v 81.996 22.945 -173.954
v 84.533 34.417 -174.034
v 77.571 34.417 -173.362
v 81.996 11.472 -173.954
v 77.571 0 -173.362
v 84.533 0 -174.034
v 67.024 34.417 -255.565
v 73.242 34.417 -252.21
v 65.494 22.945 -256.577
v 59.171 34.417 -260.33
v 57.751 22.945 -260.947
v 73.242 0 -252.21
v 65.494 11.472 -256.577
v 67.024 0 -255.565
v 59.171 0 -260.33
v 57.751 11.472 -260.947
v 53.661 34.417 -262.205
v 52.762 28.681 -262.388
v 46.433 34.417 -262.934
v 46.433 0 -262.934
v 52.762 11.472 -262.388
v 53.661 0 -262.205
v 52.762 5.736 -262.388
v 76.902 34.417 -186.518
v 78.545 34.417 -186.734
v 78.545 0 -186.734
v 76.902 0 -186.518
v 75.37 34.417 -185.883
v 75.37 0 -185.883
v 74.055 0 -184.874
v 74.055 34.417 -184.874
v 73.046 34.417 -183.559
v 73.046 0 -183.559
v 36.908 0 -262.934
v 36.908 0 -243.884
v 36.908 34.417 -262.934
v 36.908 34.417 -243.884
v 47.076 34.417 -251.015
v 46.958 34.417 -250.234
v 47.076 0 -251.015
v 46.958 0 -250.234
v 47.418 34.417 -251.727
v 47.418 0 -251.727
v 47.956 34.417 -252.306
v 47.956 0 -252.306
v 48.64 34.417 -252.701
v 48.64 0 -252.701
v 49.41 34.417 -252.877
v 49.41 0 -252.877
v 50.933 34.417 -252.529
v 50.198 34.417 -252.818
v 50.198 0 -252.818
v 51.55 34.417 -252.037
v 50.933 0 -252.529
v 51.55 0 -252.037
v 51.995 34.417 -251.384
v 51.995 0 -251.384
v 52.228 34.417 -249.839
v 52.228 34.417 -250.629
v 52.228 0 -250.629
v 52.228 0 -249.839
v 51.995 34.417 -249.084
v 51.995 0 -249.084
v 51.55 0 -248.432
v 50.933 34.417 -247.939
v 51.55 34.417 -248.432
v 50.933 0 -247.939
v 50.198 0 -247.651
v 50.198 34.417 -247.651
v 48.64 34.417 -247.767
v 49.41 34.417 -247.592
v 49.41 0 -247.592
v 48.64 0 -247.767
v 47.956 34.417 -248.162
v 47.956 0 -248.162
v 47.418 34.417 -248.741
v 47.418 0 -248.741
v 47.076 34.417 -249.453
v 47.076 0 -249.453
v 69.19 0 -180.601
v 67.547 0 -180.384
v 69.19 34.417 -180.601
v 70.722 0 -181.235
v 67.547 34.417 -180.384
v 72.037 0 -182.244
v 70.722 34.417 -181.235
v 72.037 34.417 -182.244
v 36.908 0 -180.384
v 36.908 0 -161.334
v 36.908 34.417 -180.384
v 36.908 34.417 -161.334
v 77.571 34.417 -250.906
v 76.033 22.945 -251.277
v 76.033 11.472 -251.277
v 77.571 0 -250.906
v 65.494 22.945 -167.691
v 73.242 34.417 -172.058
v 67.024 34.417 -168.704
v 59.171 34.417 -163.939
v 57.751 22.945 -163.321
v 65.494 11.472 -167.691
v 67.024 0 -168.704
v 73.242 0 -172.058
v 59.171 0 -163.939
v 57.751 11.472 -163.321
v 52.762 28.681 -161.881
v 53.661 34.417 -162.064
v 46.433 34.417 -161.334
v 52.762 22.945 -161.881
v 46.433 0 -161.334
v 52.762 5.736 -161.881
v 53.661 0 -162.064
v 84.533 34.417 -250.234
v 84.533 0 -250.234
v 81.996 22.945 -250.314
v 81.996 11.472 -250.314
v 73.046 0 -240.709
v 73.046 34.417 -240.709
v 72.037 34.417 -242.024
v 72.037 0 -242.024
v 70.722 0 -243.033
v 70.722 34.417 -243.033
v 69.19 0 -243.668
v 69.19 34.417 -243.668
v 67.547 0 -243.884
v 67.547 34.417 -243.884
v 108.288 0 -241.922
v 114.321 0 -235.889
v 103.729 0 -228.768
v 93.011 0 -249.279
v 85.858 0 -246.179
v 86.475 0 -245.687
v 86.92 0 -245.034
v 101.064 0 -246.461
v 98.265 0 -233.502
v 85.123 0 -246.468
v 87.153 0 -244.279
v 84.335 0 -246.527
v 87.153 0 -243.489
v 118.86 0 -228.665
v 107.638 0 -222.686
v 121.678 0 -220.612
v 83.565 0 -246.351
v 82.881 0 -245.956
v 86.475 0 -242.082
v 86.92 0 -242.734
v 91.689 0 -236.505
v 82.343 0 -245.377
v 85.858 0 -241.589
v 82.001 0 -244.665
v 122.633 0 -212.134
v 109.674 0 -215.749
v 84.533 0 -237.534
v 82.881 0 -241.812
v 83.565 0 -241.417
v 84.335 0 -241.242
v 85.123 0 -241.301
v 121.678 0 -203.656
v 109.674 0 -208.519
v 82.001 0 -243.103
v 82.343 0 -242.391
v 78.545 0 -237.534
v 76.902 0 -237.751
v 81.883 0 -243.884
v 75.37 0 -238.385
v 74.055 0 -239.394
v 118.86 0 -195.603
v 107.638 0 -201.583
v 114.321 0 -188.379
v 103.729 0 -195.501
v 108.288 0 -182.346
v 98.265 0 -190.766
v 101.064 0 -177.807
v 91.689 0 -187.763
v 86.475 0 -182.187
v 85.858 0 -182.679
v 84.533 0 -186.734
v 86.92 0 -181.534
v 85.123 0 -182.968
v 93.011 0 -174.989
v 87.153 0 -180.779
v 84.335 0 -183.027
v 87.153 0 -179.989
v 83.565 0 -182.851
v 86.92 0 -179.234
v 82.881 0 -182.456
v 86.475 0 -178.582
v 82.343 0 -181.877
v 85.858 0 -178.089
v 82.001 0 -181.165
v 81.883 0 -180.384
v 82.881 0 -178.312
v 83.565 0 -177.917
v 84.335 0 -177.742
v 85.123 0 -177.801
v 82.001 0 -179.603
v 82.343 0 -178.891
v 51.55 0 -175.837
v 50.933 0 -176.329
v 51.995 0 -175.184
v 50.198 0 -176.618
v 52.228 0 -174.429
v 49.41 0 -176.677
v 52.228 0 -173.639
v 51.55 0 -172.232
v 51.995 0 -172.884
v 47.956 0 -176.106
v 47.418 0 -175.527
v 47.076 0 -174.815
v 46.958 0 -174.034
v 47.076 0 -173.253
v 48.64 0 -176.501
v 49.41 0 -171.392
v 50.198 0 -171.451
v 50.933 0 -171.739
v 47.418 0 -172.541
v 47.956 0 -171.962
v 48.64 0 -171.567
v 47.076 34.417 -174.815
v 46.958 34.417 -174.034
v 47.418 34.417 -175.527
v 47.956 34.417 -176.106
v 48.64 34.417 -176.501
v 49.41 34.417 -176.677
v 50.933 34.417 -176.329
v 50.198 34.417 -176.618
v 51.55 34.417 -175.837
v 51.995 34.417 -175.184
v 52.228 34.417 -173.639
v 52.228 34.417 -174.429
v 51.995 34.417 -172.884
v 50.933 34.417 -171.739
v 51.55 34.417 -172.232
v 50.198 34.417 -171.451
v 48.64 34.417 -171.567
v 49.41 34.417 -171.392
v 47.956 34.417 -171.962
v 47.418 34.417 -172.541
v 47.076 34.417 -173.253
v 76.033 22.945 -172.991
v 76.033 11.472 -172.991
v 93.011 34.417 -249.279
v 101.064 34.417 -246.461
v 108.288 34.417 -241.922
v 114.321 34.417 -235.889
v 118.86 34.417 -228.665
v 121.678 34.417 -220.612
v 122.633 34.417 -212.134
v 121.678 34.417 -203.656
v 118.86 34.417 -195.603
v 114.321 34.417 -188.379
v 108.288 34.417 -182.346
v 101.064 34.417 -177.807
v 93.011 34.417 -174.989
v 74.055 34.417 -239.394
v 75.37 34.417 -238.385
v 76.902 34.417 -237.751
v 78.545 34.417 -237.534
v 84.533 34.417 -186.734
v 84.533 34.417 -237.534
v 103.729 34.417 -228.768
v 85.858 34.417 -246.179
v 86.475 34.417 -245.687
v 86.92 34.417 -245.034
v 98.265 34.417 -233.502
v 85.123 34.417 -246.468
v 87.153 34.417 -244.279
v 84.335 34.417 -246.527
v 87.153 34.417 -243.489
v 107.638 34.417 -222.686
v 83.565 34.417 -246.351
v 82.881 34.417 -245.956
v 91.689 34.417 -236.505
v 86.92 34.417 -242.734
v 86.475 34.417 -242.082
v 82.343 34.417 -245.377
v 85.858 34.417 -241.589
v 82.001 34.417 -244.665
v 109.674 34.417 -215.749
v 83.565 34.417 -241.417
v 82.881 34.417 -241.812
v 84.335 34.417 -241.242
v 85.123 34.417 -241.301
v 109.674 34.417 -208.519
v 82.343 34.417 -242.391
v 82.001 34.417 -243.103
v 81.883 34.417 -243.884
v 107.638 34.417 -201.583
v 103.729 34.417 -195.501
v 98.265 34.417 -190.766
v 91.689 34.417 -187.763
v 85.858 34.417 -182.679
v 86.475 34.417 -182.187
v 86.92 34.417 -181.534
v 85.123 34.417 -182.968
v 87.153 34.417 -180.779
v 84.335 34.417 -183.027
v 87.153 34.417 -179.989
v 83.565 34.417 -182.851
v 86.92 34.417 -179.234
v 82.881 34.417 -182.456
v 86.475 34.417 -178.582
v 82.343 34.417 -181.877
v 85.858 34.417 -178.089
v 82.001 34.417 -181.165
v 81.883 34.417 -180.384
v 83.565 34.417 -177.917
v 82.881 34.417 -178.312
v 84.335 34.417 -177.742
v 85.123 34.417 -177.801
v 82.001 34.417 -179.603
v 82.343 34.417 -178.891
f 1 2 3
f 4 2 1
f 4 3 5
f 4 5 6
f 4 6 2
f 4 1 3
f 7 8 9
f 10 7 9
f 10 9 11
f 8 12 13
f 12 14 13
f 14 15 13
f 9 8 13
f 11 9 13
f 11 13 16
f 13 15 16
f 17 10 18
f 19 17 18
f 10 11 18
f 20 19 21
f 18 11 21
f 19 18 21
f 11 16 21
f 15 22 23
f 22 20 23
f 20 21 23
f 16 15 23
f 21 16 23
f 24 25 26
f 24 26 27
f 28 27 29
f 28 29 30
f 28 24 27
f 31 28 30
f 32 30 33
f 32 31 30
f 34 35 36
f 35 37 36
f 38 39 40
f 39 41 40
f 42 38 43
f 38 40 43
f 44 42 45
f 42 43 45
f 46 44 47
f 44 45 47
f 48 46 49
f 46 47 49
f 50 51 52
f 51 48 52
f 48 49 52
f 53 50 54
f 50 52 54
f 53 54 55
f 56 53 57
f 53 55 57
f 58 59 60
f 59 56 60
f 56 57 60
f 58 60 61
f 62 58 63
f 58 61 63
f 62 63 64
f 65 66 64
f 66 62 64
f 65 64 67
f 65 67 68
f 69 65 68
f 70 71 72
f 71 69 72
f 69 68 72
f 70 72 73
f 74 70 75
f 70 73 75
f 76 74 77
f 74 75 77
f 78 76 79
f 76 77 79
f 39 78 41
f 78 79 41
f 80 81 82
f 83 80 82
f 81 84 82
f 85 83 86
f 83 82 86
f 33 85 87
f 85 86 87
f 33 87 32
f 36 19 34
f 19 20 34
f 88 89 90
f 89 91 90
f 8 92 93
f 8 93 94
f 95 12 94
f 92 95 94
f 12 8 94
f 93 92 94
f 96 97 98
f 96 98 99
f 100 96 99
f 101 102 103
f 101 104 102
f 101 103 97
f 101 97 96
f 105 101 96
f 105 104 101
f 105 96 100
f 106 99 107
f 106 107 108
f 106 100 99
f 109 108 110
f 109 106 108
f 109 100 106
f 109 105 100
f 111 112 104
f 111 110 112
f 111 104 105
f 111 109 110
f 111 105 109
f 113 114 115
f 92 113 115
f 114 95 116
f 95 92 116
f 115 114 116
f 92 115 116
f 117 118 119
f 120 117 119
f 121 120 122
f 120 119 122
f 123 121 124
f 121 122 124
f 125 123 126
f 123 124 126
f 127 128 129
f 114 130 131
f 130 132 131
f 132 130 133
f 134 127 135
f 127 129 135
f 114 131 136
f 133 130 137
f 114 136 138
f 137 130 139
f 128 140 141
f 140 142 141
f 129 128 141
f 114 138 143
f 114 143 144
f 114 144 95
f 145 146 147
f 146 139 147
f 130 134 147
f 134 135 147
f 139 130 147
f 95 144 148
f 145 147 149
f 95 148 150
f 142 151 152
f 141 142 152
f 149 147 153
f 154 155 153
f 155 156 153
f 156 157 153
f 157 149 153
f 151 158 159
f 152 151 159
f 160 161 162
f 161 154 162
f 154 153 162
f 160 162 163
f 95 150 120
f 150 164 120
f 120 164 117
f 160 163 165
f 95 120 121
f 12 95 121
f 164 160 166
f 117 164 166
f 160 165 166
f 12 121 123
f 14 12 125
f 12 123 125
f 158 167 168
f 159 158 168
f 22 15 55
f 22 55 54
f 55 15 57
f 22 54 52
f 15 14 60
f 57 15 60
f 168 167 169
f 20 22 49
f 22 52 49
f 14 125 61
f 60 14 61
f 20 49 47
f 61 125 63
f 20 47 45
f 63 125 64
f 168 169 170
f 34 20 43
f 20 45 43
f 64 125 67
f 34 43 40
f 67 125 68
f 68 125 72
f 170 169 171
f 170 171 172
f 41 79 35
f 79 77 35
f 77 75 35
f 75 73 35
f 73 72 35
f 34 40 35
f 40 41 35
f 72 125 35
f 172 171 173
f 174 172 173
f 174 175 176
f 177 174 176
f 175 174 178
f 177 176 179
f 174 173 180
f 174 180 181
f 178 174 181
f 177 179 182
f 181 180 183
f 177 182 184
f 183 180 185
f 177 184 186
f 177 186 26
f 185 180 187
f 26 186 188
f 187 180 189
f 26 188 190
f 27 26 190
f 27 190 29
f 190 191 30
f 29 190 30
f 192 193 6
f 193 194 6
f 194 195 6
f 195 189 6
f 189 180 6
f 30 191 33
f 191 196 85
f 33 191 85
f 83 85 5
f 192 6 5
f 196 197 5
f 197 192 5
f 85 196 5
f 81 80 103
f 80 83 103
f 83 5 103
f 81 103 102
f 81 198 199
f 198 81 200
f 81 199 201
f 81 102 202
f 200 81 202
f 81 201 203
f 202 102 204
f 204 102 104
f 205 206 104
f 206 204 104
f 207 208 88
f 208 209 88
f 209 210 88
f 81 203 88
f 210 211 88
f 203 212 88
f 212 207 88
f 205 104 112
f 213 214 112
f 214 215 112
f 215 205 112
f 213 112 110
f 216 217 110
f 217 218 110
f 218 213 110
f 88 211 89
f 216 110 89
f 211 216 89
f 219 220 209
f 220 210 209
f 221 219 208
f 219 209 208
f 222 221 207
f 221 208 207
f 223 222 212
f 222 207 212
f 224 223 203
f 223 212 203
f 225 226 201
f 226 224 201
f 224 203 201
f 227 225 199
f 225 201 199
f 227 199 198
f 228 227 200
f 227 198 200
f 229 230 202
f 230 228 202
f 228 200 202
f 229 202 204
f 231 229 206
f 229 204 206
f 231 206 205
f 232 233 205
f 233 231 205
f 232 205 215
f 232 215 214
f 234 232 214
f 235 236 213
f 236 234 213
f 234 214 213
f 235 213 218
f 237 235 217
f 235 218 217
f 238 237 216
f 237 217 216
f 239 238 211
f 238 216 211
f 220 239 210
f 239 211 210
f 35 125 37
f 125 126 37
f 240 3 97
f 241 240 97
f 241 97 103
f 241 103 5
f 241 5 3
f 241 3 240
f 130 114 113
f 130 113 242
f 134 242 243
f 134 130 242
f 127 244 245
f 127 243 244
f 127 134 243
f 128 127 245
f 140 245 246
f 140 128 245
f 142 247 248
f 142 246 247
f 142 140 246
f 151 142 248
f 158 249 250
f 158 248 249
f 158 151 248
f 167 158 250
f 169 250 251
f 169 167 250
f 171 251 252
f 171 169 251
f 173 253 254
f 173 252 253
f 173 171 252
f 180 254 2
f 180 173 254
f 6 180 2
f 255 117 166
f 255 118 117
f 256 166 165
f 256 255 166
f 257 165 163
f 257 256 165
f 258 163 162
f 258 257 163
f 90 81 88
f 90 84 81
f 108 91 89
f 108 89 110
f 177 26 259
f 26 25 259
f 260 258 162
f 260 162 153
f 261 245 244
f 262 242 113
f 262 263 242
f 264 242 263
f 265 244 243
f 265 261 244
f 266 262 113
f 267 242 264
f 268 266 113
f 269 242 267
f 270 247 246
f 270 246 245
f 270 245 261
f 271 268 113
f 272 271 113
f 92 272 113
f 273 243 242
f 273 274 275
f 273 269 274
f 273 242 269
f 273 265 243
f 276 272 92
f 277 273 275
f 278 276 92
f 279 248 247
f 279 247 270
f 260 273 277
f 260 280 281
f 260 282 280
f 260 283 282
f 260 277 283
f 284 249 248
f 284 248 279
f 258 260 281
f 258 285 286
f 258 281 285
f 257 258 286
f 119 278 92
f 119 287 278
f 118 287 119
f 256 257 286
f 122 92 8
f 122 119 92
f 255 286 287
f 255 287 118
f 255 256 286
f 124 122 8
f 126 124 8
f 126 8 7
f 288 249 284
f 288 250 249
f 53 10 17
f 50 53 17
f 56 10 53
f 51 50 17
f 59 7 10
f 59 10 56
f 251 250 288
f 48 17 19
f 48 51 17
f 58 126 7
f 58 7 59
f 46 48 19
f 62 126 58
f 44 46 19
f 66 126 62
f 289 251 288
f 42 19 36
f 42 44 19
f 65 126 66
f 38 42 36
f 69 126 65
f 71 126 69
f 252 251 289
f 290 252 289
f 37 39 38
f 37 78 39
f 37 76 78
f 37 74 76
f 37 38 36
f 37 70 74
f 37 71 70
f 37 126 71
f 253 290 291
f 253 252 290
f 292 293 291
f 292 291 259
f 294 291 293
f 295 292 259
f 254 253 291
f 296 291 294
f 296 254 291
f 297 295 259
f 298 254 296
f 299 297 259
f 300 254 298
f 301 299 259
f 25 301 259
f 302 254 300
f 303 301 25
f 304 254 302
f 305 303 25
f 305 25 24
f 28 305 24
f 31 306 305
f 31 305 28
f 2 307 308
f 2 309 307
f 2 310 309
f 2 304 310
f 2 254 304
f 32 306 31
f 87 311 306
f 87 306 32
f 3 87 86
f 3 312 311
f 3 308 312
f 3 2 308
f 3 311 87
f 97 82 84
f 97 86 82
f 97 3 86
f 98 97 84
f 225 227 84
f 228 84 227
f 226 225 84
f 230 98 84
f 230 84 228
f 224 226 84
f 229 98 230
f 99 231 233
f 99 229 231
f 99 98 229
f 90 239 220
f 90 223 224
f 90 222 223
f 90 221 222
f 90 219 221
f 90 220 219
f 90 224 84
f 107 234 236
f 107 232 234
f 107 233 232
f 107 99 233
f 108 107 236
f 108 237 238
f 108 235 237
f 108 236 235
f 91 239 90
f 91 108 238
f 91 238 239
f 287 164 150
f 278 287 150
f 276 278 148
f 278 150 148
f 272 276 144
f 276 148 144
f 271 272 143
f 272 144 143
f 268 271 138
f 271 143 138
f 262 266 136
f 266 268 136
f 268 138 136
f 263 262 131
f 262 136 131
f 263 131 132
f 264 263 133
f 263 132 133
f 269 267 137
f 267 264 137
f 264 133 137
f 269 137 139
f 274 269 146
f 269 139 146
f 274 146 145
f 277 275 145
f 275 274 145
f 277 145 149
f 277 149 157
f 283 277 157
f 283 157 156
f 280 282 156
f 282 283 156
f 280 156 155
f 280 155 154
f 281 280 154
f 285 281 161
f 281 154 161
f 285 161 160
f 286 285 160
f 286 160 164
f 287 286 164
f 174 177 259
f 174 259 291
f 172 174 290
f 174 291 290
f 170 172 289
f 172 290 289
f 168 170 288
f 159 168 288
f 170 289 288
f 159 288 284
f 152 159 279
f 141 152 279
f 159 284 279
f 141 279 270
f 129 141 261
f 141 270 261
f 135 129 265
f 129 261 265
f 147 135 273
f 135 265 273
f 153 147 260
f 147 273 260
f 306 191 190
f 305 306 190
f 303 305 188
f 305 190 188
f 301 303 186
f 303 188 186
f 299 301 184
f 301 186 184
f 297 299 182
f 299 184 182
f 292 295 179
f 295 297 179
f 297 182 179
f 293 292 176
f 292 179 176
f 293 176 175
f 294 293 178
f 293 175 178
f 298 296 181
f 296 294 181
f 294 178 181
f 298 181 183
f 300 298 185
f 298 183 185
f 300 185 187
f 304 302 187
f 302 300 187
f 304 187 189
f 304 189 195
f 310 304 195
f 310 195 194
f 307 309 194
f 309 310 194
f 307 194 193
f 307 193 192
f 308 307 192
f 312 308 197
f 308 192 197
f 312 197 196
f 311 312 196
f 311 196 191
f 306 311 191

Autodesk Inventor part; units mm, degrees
ref_plane "YZ Plane" through (0, 0, 0) normal (1, 0, 0) x (0, 1, 0)
ref_plane "XZ Plane" through (0, 0, 0) normal (0, 1, 0) x (-1, 0, 0)
ref_plane "XY Plane" through (0, 0, 0) normal (0, 0, 1) x (1, 0, 0)
sketch "Sketch1" plane through (0, 0, 0) normal (0, 1, 0) x (-1, 0, 0)
  line L0 (99.4671, -212.1342) -> (-395.7488, 283.0816) construction
  circle A0 centre (-24.2079, -174.0342) radius 2.65
  circle A1 centre (-21.0329, -212.1342) radius 6.35
  circle A2 centre (1.1921, -174.0342) radius 2.65
  circle A3 centre (10.7171, -212.1342) radius 14.2875
  circle A4 centre (26.5921, -174.0342) radius 2.65
  line L1 (-84.5329, -212.1342) -> (10.7171, -212.1342) construction
  line L2 (39.2921, -161.3342) -> (-113.1079, -161.3342)
  line L3 (-113.1079, -262.9342) -> (39.2921, -262.9342)
  circle A5 centre (-49.6079, -174.0342) radius 2.65
  circle A6 centre (-52.7829, -212.1342) radius 6.35
  circle A7 centre (-75.0079, -174.0342) radius 2.65
  circle A8 centre (-75.0079, -250.2342) radius 2.65
  circle A9 centre (-84.5329, -212.1342) radius 14.2875
  circle A10 centre (-100.4079, -174.0342) radius 2.65
  circle A11 centre (-100.4079, -250.2342) radius 2.65
  circle A12 centre (-49.6079, -250.2342) radius 2.65
  circle A13 centre (1.1921, -250.2342) radius 2.65
  circle A14 centre (26.5921, -250.2342) radius 2.65
  circle A15 centre (-24.2079, -250.2342) radius 2.65
  line L4 (39.2921, -262.9342) -> (39.2921, -161.3342)
  line L5 (39.2921, -237.5342) -> (395.5271, -237.5342)
  line L6 (74.0671, -186.7342) -> (39.2921, -186.7342)
  line L7 (-113.1079, -161.3342) -> (-113.1079, -262.9342)
  spline S0 degree 3 poles (-84.5329, -174.0342) (-65.4829, -174.0342) (-65.4829, -161.3342) (-46.4329, -161.3342) knots 1 1 1 1 2 2 2 2
  line L8 (-84.5329, -174.0342) -> (-65.4829, -174.0342) construction
  line L9 (-65.4829, -174.0342) -> (-65.4829, -161.3342) construction
  line L10 (-65.4829, -161.3342) -> (-46.4329, -161.3342) construction
  circle A16 centre (-84.5329, -212.1342) radius 38.1
  circle A17 centre (-84.5329, -180.3842) radius 2.65
  spline S1 degree 3 poles (-84.5329, -250.2342) (-65.4829, -250.2342) (-65.4829, -262.9342) (-46.4329, -262.9342) knots 1 1 1 1 2 2 2 2
  line L11 (-84.5329, -250.2342) -> (-65.4829, -250.2342) construction
  line L12 (-65.4829, -250.2342) -> (-65.4829, -262.9342) construction
  line L13 (-65.4829, -262.9342) -> (-46.4329, -262.9342) construction
  circle A18 centre (-84.5329, -243.8842) radius 2.65
  point P0 (0, 0)
  point P1 (-36.9079, -262.9342)
  point P2 (-36.9079, -212.1342)
  point P3 (39.2921, -212.1342)
  point P4 (-46.4329, -262.9342)
  point P5 (-46.4329, -161.3342)
  dimension "d0" = 31.75
extrude "Extrusion1" add sketch "Sketch1" along normal blind 34.417 contours L4 L3 S1 A8 A16 A7 S0 L2 | A7 A16 S0 | A16 A7 A8 L7 | L7 A16 | A7 A16 S0 | A7 A16 | A16 A8 S1 | S1 A8 A16 | A8 A16
sketch "Sketch2" plane through (0, 34.417, 0) normal (0, 1, 0) x (1, 0, 0)
  circle A0 centre (49.6079, 174.0342) radius 2.65 projected
  circle A1 centre (49.6079, 174.0342) radius 2.65
  line L0 (49.6079, 174.0342) -> (36.9079, 174.0342)
  line L1 (-39.2921, 161.3342) -> (46.4329, 161.3342) projected
  line L2 (36.9079, 161.3342) -> (36.9079, 271.4653)
  line L3 (36.9079, 271.4653) -> (-75.2217, 284.061)
  line L4 (-75.2217, 284.061) -> (-39.9967, 13.0358)
  line L5 (-39.9967, 13.0358) -> (36.9079, 161.3342)
  point P0 (0, 0)
  dimension "d3" = 12.7
extrude "Extrusion2" cut sketch "Sketch2" against normal through all contours L2 L5 L4 L3
sketch "Sketch3" plane through (0, 34.417, 0) normal (0, 1, 0) x (1, 0, 0)
  line L0 (26.0555, 454.6039) -> (26.0555, 378.7664)
  line L1 (26.0555, 454.6039) -> (26.0555, 378.7664)
  arc A0 (38.7555, 340.6664) -> (114.9555, 340.6664) centre (76.8555, 340.6664) ccw
  circle A1 centre (76.8555, 340.6664) radius 38.1
  line L2 (26.0555, 378.7664) -> (45.1055, 378.7664)
  line L3 (45.1055, 357.6525) -> (45.1055, 454.6039)
  arc A2 (51.4555, 340.6664) -> (102.2555, 340.6664) centre (76.8555, 340.6664) ccw
  line L4 (45.1055, 378.7664) -> (51.4555, 378.7664)
  line L5 (51.4555, 346.6539) -> (51.4555, 340.6664)
  line L6 (45.1055, 353.0039) -> (45.1055, 353.0039)
  arc A3 (51.4555, 346.6539) -> (48.2805, 352.1532) centre (45.1055, 346.6539) ccw
  arc A4 (45.1055, 357.6525) -> (48.2805, 352.1532) centre (51.4555, 357.6525) ccw
  line L7 (108.6055, 357.6525) -> (108.6055, 454.6039)
  arc A5 (105.4305, 352.1532) -> (102.2555, 346.6539) centre (108.6055, 346.6539) ccw
  arc A6 (105.4305, 352.1532) -> (108.6055, 357.6525) centre (102.2555, 357.6525) ccw
  line L8 (102.2555, 346.6539) -> (102.2555, 340.6664)
  line L9 (127.6555, 378.7664) -> (127.6555, 454.8164)
  line L10 (127.6555, 454.8164) -> (127.6555, 337.8192)
  spline S0 degree 3 poles (26.0555, 378.7664) (26.0555, 359.7164) (38.7555, 359.7164) (38.7555, 340.6664) knots 1 1 1 1 2 2 2 2
  line L11 (26.0555, 378.7664) -> (26.0555, 359.7164) construction
  line L12 (26.0555, 359.7164) -> (38.7555, 359.7164) construction
  line L13 (38.7555, 359.7164) -> (38.7555, 340.6664) construction
  line L14 (76.8555, 340.6664) -> (76.8555, 373.056)
  spline S1 degree 3 poles (127.6555, 378.7664) (127.6555, 359.7164) (114.9555, 359.7164) (114.9555, 340.6664) knots 1 1 1 1 2 2 2 2
  line L15 (127.6555, 378.7664) -> (127.6555, 359.7164) construction
  line L16 (127.6555, 359.7164) -> (114.9555, 359.7164) construction
  line L17 (114.9555, 359.7164) -> (114.9555, 340.6664) construction
  circle A7 centre (38.7555, 400.9914) radius 2.65
  circle A8 centre (38.7555, 400.9914) radius 2.65
  circle A9 centre (38.7555, 375.5914) radius 2.65
  circle A10 centre (38.7555, 375.5914) radius 2.65
  circle A11 centre (45.1055, 340.6664) radius 2.65
  circle A12 centre (45.1055, 340.6664) radius 2.65
  circle A13 centre (108.6055, 340.6664) radius 2.65
  circle A14 centre (108.6055, 340.6664) radius 2.65
  circle A15 centre (114.9555, 375.5914) radius 2.65
  circle A16 centre (114.9555, 375.5914) radius 2.65
  circle A17 centre (114.9555, 400.9914) radius 2.65
  circle A18 centre (114.9555, 400.9914) radius 2.65
  circle A19 centre (76.8555, 308.9164) radius 2.65
  circle A20 centre (76.8555, 308.9164) radius 2.65
  line L18 (70.868, 315.2664) -> (76.8555, 315.2664)
  arc A21 (70.868, 315.2664) -> (65.3687, 312.0914) centre (70.868, 308.9164) ccw
  line L19 (64.518, 308.9164) -> (64.518, 308.9164)
  arc A22 (59.8694, 308.9164) -> (65.3687, 312.0914) centre (59.8694, 315.2664) ccw
  line L20 (57.8055, 302.5664) -> (76.8555, 302.5664) construction
  spline S2 degree 3 poles (38.7555, 289.8664) (57.8055, 289.8664) (57.8055, 302.5664) (76.8555, 302.5664) knots 1 1 1 1 2 2 2 2
  line L21 (38.7555, 289.8664) -> (57.8055, 289.8664) construction
  line L22 (57.8055, 289.8664) -> (57.8055, 302.5664) construction
  line L23 (38.7555, 308.9164) -> (38.7555, 315.2664)
  line L24 (38.7555, 289.8664) -> (38.7555, 308.9164)
  circle A23 centre (41.9305, 302.5664) radius 2.65
  line L25 (-37.082, 289.8664) -> (38.7555, 289.8664)
  line L26 (-37.082, 289.8664) -> (38.7555, 289.8664)
  line L27 (59.8694, 308.9164) -> (-37.082, 308.9164)
  line L28 (59.8694, 372.4164) -> (-37.082, 372.4164)
  circle A24 centre (16.5305, 378.7664) radius 2.65
  circle A25 centre (16.5305, 378.7664) radius 2.65
  line L29 (-37.2945, 391.4664) -> (79.7027, 391.4664)
  line L30 (38.7555, 391.4664) -> (-37.2945, 391.4664)
  circle A26 centre (16.5305, 302.5664) radius 2.65
  circle A27 centre (16.5305, 302.5664) radius 2.65
  circle A28 centre (41.9305, 302.5664) radius 2.65
  circle A29 centre (41.9305, 378.7664) radius 2.65
  circle A30 centre (41.9305, 378.7664) radius 2.65
  line L31 (38.7555, 391.4664) -> (57.8055, 391.4664) construction
  spline S3 degree 3 poles (38.7555, 391.4664) (57.8055, 391.4664) (57.8055, 378.7664) (76.8555, 378.7664) knots 1 1 1 1 2 2 2 2
  line L32 (57.8055, 391.4664) -> (57.8055, 378.7664) construction
  line L33 (57.8055, 378.7664) -> (76.8555, 378.7664) construction
  arc A31 (65.3687, 369.2414) -> (59.8694, 372.4164) centre (59.8694, 366.0664) ccw
  arc A32 (65.3687, 369.2414) -> (70.868, 366.0664) centre (70.868, 372.4164) ccw
  line L34 (70.868, 366.0664) -> (76.8555, 366.0664)
  circle A33 centre (76.8555, 372.4164) radius 2.65
  circle A34 centre (76.8555, 372.4164) radius 2.65
  arc A35 (76.8555, 302.5664) -> (76.8555, 378.7664) centre (76.8555, 340.6664) ccw
  circle A36 centre (76.8555, 340.6664) radius 38.1
  line L35 (76.8555, 340.6664) -> (44.4659, 340.6664)
  arc A37 (76.8555, 315.2664) -> (76.8555, 366.0664) centre (76.8555, 340.6664) ccw
  circle A38 centre (84.5329, 212.1342) radius 14.2875 projected
  circle A39 centre (84.5329, 212.1342) radius 14.2875
  circle A40 centre (52.7829, 212.1342) radius 2.65
  circle A41 centre (52.7829, 212.1342) radius 2.65
  line L36 (59.1329, 218.1218) -> (59.1329, 212.1342)
  arc A42 (59.1329, 218.1218) -> (55.9579, 223.6211) centre (52.7829, 218.1218) ccw
  line L37 (52.7829, 224.4718) -> (52.7829, 224.4718)
  arc A43 (52.7829, 229.1203) -> (55.9579, 223.6211) centre (59.1329, 229.1203) ccw
  line L38 (46.4329, 231.1842) -> (46.4329, 212.1342) construction
  spline S4 degree 3 poles (33.7329, 250.2342) (33.7329, 231.1842) (46.4329, 231.1842) (46.4329, 212.1342) knots 1 1 1 1 2 2 2 2
  line L39 (33.7329, 250.2342) -> (33.7329, 231.1842) construction
  line L40 (33.7329, 231.1842) -> (46.4329, 231.1842) construction
  line L41 (52.7829, 250.2342) -> (59.1329, 250.2342)
  line L42 (33.7329, 250.2342) -> (52.7829, 250.2342)
  circle A44 centre (46.4329, 247.0592) radius 2.65
  line L43 (33.7329, 326.0718) -> (33.7329, 250.2342)
  line L44 (33.7329, 326.0718) -> (33.7329, 250.2342)
  line L45 (52.7829, 229.1203) -> (52.7829, 326.0718)
  line L46 (116.2829, 229.1203) -> (116.2829, 326.0718)
  circle A45 centre (122.6329, 272.4592) radius 2.65
  circle A46 centre (122.6329, 272.4592) radius 2.65
  line L47 (135.3329, 326.2842) -> (135.3329, 209.2871)
  line L48 (135.3329, 250.2342) -> (135.3329, 326.2842)
  circle A47 centre (46.4329, 272.4592) radius 2.65
  circle A48 centre (46.4329, 272.4592) radius 2.65
  circle A49 centre (46.4329, 247.0592) radius 2.65
  circle A50 centre (122.6329, 247.0592) radius 2.65
  circle A51 centre (122.6329, 247.0592) radius 2.65
  line L49 (135.3329, 250.2342) -> (135.3329, 231.1842) construction
  spline S5 degree 3 poles (135.3329, 250.2342) (135.3329, 231.1842) (122.6329, 231.1842) (122.6329, 212.1342) knots 1 1 1 1 2 2 2 2
  line L50 (135.3329, 231.1842) -> (122.6329, 231.1842) construction
  line L51 (122.6329, 231.1842) -> (122.6329, 212.1342) construction
  arc A52 (113.1079, 223.6211) -> (116.2829, 229.1203) centre (109.9329, 229.1203) ccw
  arc A53 (113.1079, 223.6211) -> (109.9329, 218.1218) centre (116.2829, 218.1218) ccw
  line L52 (109.9329, 218.1218) -> (109.9329, 212.1342)
  circle A54 centre (116.2829, 212.1342) radius 2.65
  circle A55 centre (116.2829, 212.1342) radius 2.65
  arc A56 (46.4329, 212.1342) -> (122.6329, 212.1342) centre (84.5329, 212.1342) ccw
  circle A57 centre (84.5329, 212.1342) radius 38.1
  line L53 (84.5329, 212.1342) -> (84.5329, 244.5238)
  arc A58 (59.1329, 212.1342) -> (109.9329, 212.1342) centre (84.5329, 212.1342) ccw
  line L54 (78.5454, 237.5342) -> (84.5329, 237.5342)
  arc A59 (73.0461, 240.7092) -> (78.5454, 237.5342) centre (78.5454, 243.8842) ccw
  line L55 (84.5329, 212.1342) -> (52.1434, 212.1342)
  arc A60 (84.5329, 186.7342) -> (84.5329, 237.5342) centre (84.5329, 212.1342) ccw
  circle A61 centre (84.5329, 212.1342) radius 38.1
  arc A62 (84.5329, 174.0342) -> (84.5329, 250.2342) centre (84.5329, 212.1342) ccw
  line L56 (78.5454, 186.7342) -> (84.5329, 186.7342)
  arc A63 (78.5454, 186.7342) -> (73.0461, 183.5592) centre (78.5454, 180.3842) ccw
  line L57 (72.1954, 180.3842) -> (72.1954, 180.3842)
  arc A64 (67.5469, 180.3842) -> (73.0461, 183.5592) centre (67.5469, 186.7342) ccw
  circle A65 centre (84.5329, 180.3842) radius 2.65
  circle A66 centre (84.5329, 180.3842) radius 2.65
  line L58 (65.4829, 174.0342) -> (84.5329, 174.0342) construction
  spline S6 degree 3 poles (46.4329, 161.3342) (65.4829, 161.3342) (65.4829, 174.0342) (84.5329, 174.0342) knots 1 1 1 1 2 2 2 2
  line L59 (46.4329, 161.3342) -> (65.4829, 161.3342) construction
  line L60 (65.4829, 161.3342) -> (65.4829, 174.0342) construction
  line L61 (46.4329, 180.3842) -> (46.4329, 186.7342)
  circle A67 centre (84.5329, 243.8842) radius 2.65
  circle A68 centre (84.5329, 243.8842) radius 2.65
  line L62 (65.4829, 250.2342) -> (84.5329, 250.2342) construction
  spline S7 degree 3 poles (46.4329, 262.9342) (65.4829, 262.9342) (65.4829, 250.2342) (84.5329, 250.2342) knots 1 1 1 1 2 2 2 2
  line L63 (46.4329, 262.9342) -> (65.4829, 262.9342) construction
  line L64 (65.4829, 262.9342) -> (65.4829, 250.2342) construction
  circle A69 centre (49.6079, 250.2342) radius 2.65
  circle A70 centre (49.6079, 250.2342) radius 2.65
  arc A71 (73.0461, 240.7092) -> (67.5469, 243.8842) centre (67.5469, 237.5342) ccw
  line L65 (46.4329, 161.3342) -> (46.4329, 180.3842)
  circle A72 centre (49.6079, 174.0342) radius 2.65
  line L66 (-29.4046, 161.3342) -> (46.4329, 161.3342)
  line L67 (-29.4046, 161.3342) -> (46.4329, 161.3342)
  line L68 (67.5469, 180.3842) -> (-29.4046, 180.3842)
  line L69 (67.5469, 243.8842) -> (-29.4046, 243.8842)
  circle A73 centre (24.2079, 250.2342) radius 2.65
  circle A74 centre (24.2079, 250.2342) radius 2.65
  line L70 (-29.6171, 262.9342) -> (87.3801, 262.9342)
  line L71 (46.4329, 262.9342) -> (-29.6171, 262.9342)
  circle A75 centre (49.6079, 174.0342) radius 2.65
  circle A76 centre (24.2079, 174.0342) radius 2.65
  circle A77 centre (24.2079, 174.0342) radius 2.65
  line L72 (-29.4046, 180.3842) -> (-29.4046, 243.8842)
  point P0 (0, 0)
  point P1 (161.6667, 205.692)
  point P2 (36.9079, 161.3342)
  point P3 (71.58, 306.9082)
  point P4 (46.4329, 161.3342)
  point P5 (110.6137, 335.3909)
  point P6 (79.2575, 178.376)
  point P7 (118.2912, 206.8588)
  dimension "d9" = 19.05
  dimension "d10" = 12.7
  dimension "d11" = 76.2
  dimension "d12" = 101.6
  dimension "d13" = 6.35
  dimension "d14" = 19.05
  dimension "d15" = 19.05
  dimension "d16" = 19.05
  dimension "d17" = 12.7
  dimension "d18" = 76.2
  dimension "d19" = 101.6
  dimension "d20" = 6.35
  dimension "d21" = 19.05
  dimension "d22" = 19.05
  dimension "d23" = 19.05
  dimension "d24" = 12.7
  dimension "d25" = 76.2
  dimension "d26" = 101.6
  dimension "d27" = 6.35
  dimension "d28" = 19.05
  dimension "d29" = 19.05
  dimension "d30" = 19.05
  dimension "d31" = 12.7
  dimension "d32" = 76.2
  dimension "d33" = 101.6
  dimension "d34" = 6.35
  dimension "d35" = 19.05
  dimension "d36" = 19.05
extrude "Extrusion3" cut sketch "Sketch3" against normal through all contours L69 A57 L45 | L45 A57 S4 L69 | L69 A71 A59 L54 L53 A38 L55 L36 A42 A43 L45 A57 | S4 A56 L68 L72 L69 | L45 A43 A42 L36 A58 L56 A63 A64 L68 A56 A57 | A58 L55 A38 L53 A60
properties part number "L1 Gearbox Cover"
